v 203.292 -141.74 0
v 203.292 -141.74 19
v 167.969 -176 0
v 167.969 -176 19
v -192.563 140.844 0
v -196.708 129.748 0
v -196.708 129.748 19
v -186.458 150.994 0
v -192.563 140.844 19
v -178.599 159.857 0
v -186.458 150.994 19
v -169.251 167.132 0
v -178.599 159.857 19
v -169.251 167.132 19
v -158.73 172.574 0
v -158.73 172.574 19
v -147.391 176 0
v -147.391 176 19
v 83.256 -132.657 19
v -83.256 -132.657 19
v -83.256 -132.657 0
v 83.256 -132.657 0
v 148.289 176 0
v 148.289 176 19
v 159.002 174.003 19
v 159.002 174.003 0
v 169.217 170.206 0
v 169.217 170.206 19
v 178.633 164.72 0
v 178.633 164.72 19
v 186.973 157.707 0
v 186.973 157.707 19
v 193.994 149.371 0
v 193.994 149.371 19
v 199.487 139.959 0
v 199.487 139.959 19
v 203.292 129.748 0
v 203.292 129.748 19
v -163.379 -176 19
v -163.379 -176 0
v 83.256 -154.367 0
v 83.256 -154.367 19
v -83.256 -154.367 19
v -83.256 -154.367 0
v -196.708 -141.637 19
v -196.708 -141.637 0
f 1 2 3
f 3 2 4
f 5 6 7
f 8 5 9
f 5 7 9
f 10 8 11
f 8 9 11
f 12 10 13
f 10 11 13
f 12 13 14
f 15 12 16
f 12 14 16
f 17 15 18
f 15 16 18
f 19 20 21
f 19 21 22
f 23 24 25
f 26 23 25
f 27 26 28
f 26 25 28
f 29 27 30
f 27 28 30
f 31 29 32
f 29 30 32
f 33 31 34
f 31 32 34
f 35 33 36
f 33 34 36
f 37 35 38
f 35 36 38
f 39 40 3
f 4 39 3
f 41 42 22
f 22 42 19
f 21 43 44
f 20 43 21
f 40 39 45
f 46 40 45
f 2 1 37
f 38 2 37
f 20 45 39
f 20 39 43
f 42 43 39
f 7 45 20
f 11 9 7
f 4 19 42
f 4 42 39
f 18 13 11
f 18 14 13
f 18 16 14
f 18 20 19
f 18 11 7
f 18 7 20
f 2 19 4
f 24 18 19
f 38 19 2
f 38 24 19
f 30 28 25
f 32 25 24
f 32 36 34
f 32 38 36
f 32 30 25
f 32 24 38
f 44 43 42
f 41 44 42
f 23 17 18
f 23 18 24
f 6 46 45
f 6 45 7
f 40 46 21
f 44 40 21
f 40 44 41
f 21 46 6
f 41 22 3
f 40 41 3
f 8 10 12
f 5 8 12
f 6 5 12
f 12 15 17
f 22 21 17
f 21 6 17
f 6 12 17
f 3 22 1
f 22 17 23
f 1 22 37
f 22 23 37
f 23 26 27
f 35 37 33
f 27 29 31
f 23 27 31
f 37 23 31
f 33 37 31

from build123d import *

# Parameters (mm, degrees)
F0_W     = 400
F0_H     = 352
F1_DEPTH = 19
F3_DEPTH = 19.001
F5_DEPTH = 19.001
F6_W     = 166.512146
F6_H     = 21.710783
F7_DEPTH = 19.001


with BuildPart() as f1:
    # F0 (on Top) → F1 (new body)
    with BuildSketch(Plane.XY):
        with Locations((3.291806, 0)):
            Rectangle(F0_W, F0_H)
    extrude(amount=F1_DEPTH)

    # F2 (on face) → F3 (cut, through all)
    with BuildSketch(Plane.XY.offset(19)):
        with BuildLine():
            ThreePointArc((-196.708194, 129.747689), (-178.598659, 159.856691), (-147.391275, 176))
            Line((-147.391275, 176), (-196.708194, 176))
            Line((-196.708194, 176), (-196.708194, 129.747689))
        make_face()
        with BuildLine():
            Line((203.291806, 176), (148.288742, 176))
            ThreePointArc((148.288742, 176), (182.953617, 161.392464), (203.291806, 129.747689))
            Line((203.291806, 129.747689), (203.291806, 176))
        make_face()
    extrude(amount=-F3_DEPTH, mode=Mode.SUBTRACT)

    # F4 (on face) → F5 (cut, through all)
    with BuildSketch(Plane.XY.offset(19)):
        Polygon((-163.379148, -176), (-196.708194, -141.636923), (-196.708194, -176), align=None)
        Polygon((203.291806, -141.739659), (167.968541, -176), (203.291806, -176), align=None)
    extrude(amount=-F5_DEPTH, mode=Mode.SUBTRACT)

    # F6 (on face) → F7 (cut, through all)
    with BuildSketch(Plane.XY.offset(19)):
        with Locations((0, -143.512011)):
            Rectangle(F6_W, F6_H)
    extrude(amount=-F7_DEPTH, mode=Mode.SUBTRACT)


solid = f1.part
